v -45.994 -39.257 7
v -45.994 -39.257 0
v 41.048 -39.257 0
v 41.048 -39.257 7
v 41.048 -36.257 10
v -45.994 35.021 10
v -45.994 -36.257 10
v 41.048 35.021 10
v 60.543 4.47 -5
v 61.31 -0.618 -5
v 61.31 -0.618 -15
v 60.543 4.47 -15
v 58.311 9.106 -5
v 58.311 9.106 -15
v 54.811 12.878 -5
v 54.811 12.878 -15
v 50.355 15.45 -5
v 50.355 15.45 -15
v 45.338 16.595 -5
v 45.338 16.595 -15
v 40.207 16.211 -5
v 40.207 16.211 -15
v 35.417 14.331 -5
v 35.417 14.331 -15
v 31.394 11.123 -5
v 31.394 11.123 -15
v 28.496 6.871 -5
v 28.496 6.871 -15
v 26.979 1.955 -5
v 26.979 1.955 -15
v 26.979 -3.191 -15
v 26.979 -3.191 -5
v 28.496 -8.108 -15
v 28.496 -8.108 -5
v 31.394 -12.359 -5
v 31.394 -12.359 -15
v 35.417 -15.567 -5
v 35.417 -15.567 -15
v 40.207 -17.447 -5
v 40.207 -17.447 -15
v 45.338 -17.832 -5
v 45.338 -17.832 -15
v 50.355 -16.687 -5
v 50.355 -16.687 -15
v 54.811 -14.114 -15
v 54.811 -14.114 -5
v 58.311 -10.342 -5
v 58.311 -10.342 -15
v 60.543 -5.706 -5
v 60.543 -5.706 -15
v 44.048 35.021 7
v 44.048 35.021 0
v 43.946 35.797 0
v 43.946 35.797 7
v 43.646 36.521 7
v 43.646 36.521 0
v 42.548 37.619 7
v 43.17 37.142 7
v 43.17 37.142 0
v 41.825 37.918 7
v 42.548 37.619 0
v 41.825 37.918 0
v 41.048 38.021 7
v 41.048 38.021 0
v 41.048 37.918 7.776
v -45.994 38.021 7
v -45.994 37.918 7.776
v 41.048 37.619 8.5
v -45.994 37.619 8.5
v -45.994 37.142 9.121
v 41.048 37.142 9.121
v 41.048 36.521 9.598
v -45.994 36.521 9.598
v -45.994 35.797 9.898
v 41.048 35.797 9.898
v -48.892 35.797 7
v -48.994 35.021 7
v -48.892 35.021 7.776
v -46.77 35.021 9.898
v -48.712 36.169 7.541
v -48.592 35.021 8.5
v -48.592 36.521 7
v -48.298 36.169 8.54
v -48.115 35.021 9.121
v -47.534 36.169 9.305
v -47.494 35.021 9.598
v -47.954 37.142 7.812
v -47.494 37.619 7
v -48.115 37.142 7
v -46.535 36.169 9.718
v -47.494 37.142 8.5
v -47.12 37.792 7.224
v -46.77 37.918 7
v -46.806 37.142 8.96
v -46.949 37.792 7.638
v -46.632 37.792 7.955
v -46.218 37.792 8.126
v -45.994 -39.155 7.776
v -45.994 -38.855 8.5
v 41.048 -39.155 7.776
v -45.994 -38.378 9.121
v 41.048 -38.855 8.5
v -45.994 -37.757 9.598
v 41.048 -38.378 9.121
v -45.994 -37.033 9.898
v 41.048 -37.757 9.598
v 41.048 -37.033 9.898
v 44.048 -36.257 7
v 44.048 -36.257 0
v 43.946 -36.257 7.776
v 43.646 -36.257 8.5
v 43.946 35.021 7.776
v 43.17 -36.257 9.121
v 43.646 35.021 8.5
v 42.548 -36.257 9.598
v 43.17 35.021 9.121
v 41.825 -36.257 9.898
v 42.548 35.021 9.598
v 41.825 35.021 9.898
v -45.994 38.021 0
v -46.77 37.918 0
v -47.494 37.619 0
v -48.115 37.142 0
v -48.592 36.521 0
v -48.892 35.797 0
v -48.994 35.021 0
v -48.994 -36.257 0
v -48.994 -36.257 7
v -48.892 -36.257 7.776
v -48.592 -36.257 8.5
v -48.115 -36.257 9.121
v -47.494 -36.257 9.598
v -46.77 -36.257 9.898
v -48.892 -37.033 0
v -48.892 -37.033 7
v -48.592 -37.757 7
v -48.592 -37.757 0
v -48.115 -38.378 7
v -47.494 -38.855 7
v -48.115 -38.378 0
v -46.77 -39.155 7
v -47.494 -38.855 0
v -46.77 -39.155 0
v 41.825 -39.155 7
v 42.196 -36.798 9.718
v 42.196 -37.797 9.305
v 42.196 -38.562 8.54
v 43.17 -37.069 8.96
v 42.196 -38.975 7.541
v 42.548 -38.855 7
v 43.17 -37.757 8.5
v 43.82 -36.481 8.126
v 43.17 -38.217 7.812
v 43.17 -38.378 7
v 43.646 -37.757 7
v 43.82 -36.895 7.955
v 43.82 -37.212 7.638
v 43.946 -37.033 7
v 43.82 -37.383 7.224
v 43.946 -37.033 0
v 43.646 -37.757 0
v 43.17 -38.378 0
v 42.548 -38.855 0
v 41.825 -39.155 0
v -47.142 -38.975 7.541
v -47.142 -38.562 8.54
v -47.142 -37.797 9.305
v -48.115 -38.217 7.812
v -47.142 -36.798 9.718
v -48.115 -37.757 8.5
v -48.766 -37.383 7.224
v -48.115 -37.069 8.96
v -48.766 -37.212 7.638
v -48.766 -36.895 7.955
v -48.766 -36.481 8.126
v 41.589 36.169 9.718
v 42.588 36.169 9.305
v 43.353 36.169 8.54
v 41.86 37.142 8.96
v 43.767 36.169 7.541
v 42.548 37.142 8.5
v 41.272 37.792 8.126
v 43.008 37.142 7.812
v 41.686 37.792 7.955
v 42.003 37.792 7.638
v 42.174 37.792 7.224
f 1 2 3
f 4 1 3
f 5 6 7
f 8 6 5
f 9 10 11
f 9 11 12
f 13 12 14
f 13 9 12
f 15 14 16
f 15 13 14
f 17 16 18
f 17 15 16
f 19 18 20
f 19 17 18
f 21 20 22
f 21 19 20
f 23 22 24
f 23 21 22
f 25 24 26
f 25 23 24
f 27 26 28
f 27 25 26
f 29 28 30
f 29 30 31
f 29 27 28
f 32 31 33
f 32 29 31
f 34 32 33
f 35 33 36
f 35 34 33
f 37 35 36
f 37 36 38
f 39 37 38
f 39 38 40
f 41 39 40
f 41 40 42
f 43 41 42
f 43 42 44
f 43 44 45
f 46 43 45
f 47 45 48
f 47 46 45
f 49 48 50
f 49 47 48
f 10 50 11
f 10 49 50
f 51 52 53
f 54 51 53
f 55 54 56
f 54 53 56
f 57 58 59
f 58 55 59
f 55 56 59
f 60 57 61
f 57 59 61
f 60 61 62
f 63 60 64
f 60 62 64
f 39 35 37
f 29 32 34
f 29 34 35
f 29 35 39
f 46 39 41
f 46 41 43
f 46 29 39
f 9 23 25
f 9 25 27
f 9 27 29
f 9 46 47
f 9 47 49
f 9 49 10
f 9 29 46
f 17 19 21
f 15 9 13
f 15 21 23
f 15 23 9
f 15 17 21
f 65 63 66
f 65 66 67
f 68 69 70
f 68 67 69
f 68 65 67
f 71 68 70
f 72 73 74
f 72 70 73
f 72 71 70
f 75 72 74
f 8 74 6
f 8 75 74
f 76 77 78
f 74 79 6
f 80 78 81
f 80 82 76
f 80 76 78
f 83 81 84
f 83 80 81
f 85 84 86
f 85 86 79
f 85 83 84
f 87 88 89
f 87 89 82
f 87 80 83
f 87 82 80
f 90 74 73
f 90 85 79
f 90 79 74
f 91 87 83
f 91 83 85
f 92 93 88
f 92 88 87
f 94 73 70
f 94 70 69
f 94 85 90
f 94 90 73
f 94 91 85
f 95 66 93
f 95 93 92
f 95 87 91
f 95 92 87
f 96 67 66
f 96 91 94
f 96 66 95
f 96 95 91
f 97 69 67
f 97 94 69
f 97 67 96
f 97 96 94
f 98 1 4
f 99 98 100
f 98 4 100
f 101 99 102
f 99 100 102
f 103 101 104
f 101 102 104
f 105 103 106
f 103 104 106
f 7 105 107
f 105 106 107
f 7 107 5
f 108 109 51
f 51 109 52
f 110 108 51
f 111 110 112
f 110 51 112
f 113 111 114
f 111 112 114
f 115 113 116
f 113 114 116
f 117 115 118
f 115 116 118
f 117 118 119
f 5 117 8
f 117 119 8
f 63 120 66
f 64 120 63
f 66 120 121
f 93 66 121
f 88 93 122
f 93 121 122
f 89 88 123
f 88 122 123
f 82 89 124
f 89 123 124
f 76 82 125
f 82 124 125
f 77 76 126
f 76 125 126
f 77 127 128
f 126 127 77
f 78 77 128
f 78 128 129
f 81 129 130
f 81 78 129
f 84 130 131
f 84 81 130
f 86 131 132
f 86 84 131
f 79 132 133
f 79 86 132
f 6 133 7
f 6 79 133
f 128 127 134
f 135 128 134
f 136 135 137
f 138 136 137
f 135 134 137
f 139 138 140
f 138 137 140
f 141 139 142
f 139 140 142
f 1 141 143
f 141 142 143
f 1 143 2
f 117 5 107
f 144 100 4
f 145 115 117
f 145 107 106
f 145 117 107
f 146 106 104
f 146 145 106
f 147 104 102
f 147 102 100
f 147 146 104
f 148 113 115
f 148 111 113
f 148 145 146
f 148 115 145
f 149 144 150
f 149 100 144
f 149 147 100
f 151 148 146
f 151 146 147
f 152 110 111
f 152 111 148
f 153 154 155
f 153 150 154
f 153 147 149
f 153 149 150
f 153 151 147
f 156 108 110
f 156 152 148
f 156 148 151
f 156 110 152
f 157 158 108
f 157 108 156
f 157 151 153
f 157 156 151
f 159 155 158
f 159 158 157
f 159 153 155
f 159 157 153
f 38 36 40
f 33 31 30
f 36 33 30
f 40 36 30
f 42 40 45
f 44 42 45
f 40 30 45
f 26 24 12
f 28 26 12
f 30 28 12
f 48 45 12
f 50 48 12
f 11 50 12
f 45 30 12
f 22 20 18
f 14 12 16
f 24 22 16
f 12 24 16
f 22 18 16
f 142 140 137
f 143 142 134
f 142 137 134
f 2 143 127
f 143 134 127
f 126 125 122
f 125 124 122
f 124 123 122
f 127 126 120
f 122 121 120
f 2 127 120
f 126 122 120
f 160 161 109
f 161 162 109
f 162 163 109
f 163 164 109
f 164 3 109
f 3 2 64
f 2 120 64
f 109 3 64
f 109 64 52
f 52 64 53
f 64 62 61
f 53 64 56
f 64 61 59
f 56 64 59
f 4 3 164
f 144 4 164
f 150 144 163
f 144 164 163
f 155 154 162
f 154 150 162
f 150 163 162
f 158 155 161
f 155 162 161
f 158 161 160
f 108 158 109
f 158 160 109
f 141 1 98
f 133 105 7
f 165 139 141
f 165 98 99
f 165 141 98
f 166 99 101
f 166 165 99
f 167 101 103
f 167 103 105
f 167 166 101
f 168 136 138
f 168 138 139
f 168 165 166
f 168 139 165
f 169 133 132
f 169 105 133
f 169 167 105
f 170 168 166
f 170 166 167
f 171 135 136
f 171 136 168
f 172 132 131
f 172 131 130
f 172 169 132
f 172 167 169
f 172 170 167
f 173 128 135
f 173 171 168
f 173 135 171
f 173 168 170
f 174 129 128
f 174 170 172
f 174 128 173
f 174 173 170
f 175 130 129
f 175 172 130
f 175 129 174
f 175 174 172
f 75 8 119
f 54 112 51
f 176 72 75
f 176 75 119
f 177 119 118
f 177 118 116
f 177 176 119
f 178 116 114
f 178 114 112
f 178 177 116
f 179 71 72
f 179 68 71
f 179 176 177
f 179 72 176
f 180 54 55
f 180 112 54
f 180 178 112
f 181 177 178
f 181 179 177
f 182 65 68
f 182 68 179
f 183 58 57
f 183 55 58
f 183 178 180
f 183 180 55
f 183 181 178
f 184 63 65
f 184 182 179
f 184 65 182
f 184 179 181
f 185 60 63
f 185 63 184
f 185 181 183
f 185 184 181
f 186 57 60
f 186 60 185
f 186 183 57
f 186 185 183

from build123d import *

# Parameters (mm, degrees)
F_1_FR_W        = 93.042145165
F_1_FR_H        = 77.277529207
EXTRUDE_1_DEPTH = 10
SKETCH_5_R      = 17.261773312
EXTRUDE_2_DEPTH = 10
FILLET_1_R      = 3
FILLET_2_R      = 3
FILLET_3_R      = 3


with BuildPart() as part:
    # Эскиз1_fr → Бобышка-Вытянуть1 (new body)
    with BuildSketch(Plane.XY):
        with Locations((-2.472880935, -0.618220234)):
            Rectangle(F_1_FR_W, F_1_FR_H)
    extrude(amount=EXTRUDE_1_DEPTH)

    # Скругление1
    fillet_1_edges = [part.edges().sort_by_distance(p)[0] for p in [
        (44.048191648, -0.618220234, 10),
        (-2.472880935, 38.02054437, 10),
        (-48.993953517, -0.618220234, 10),
        (-2.472880935, -39.256984837, 10),
    ]]
    fillet(fillet_1_edges, radius=FILLET_1_R)

    # Скругление2
    # the kernel refuses this fillet: 3 mm, written as the material it takes off along each edge
    with BuildSketch(Plane(origin=(41.048191648, -36.256984837, 7), x_dir=(0, -1, 0), z_dir=(1, 0, 0))) as fillet_2_piece_1_section:
        Polygon((0, 0), (FILLET_2_R, 0), (FILLET_2_R, -FILLET_2_R), (0, -FILLET_2_R), align=None)
    fillet_2_piece_1 = extrude(amount=FILLET_2_R, mode=Mode.PRIVATE)
    fillet_2_piece_1 = fillet_2_piece_1 - Plane(origin=(41.048191648, -36.256984837, 7), x_dir=(0, 0.7071067811865475, -0.7071067811865475), z_dir=(1, 0, 0)) * Sphere(FILLET_2_R, mode=Mode.PRIVATE)
    add(fillet_2_piece_1, mode=Mode.SUBTRACT)
    with BuildSketch(Plane(origin=(44.048191648, -39.256984837, -7.5), x_dir=(0, 1, 0), z_dir=(0, 0, 1))) as fillet_2_piece_2:
        with BuildLine():
            CenterArc((FILLET_2_R, FILLET_2_R), FILLET_2_R, 180, 90)
            Line((0, FILLET_2_R), (0, 0))
            Line((0, 0), (FILLET_2_R, 0))
        make_face()
    extrude(amount=14.5, mode=Mode.SUBTRACT)

    # Скругление3
    # the kernel refuses this fillet: 3 mm, written as the material it takes off along each edge
    with BuildSketch(Plane(origin=(-45.993953517, -36.256984837, 7), x_dir=(0, -1, 0), z_dir=(-1, 0, 0))) as fillet_3_piece_1_section:
        Polygon((0, 0), (FILLET_3_R, 0), (FILLET_3_R, FILLET_3_R), (0, FILLET_3_R), align=None)
    fillet_3_piece_1 = extrude(amount=FILLET_3_R, mode=Mode.PRIVATE)
    fillet_3_piece_1 = fillet_3_piece_1 - Plane(origin=(-45.993953517, -36.256984837, 7), x_dir=(0, 0.7071067811865475, -0.7071067811865475), z_dir=(-1, 0, 0)) * Sphere(FILLET_3_R, mode=Mode.PRIVATE)
    add(fillet_3_piece_1, mode=Mode.SUBTRACT)
    with BuildSketch(Plane(origin=(41.048191648, 35.02054437, 7), x_dir=(1, 0, 0), z_dir=(0, 1, 0))) as fillet_3_piece_2_section:
        Polygon((0, 0), (FILLET_3_R, 0), (FILLET_3_R, -FILLET_3_R), (0, -FILLET_3_R), align=None)
    fillet_3_piece_2 = extrude(amount=FILLET_3_R, mode=Mode.PRIVATE)
    fillet_3_piece_2 = fillet_3_piece_2 - Plane(origin=(41.048191648, 35.02054437, 7), x_dir=(-0.7071067811865475, 0, -0.7071067811865475), z_dir=(0, 1, 0)) * Sphere(FILLET_3_R, mode=Mode.PRIVATE)
    add(fillet_3_piece_2, mode=Mode.SUBTRACT)
    with BuildSketch(Plane(origin=(-45.993953517, 35.02054437, 7), x_dir=(-1, 0, 0), z_dir=(0, 1, 0))) as fillet_3_piece_3_section:
        Polygon((0, 0), (FILLET_3_R, 0), (FILLET_3_R, FILLET_3_R), (0, FILLET_3_R), align=None)
    fillet_3_piece_3 = extrude(amount=FILLET_3_R, mode=Mode.PRIVATE)
    fillet_3_piece_3 = fillet_3_piece_3 - Plane(origin=(-45.993953517, 35.02054437, 7), x_dir=(0.7071067811865475, 0, -0.7071067811865475), z_dir=(0, 1, 0)) * Sphere(FILLET_3_R, mode=Mode.PRIVATE)
    add(fillet_3_piece_3, mode=Mode.SUBTRACT)
    with BuildSketch(Plane(origin=(-48.993953517, 38.02054437, -7.5), x_dir=(1, 0, 0), z_dir=(0, 0, 1)), Plane(origin=(-48.993953517, -39.256984837, -7.5), x_dir=(0, 1, 0), z_dir=(0, 0, 1))) as fillet_3_piece_4:
        with BuildLine():
            CenterArc((FILLET_3_R, -FILLET_3_R), FILLET_3_R, 90, 90)
            Line((0, -FILLET_3_R), (0, 0))
            Line((0, 0), (FILLET_3_R, 0))
        make_face()
    extrude(amount=14.5, mode=Mode.SUBTRACT)
    with BuildSketch(Plane(origin=(44.048191648, 38.02054437, -7.5), x_dir=(-1, 0, 0), z_dir=(0, 0, 1))) as fillet_3_piece_5:
        with BuildLine():
            CenterArc((FILLET_3_R, FILLET_3_R), FILLET_3_R, 180, 90)
            Line((0, FILLET_3_R), (0, 0))
            Line((0, 0), (FILLET_3_R, 0))
        make_face()
    extrude(amount=14.5, mode=Mode.SUBTRACT)


with BuildPart() as body_2:
    # Эскиз5 → Бобышка-Вытянуть2 (new body)
    with BuildSketch(Plane.XY.offset(-5)):
        with Locations((44.048191648, -0.618220234)):
            Circle(SKETCH_5_R)
    extrude(amount=-EXTRUDE_2_DEPTH)


solid = Compound([part.part, body_2.part])
